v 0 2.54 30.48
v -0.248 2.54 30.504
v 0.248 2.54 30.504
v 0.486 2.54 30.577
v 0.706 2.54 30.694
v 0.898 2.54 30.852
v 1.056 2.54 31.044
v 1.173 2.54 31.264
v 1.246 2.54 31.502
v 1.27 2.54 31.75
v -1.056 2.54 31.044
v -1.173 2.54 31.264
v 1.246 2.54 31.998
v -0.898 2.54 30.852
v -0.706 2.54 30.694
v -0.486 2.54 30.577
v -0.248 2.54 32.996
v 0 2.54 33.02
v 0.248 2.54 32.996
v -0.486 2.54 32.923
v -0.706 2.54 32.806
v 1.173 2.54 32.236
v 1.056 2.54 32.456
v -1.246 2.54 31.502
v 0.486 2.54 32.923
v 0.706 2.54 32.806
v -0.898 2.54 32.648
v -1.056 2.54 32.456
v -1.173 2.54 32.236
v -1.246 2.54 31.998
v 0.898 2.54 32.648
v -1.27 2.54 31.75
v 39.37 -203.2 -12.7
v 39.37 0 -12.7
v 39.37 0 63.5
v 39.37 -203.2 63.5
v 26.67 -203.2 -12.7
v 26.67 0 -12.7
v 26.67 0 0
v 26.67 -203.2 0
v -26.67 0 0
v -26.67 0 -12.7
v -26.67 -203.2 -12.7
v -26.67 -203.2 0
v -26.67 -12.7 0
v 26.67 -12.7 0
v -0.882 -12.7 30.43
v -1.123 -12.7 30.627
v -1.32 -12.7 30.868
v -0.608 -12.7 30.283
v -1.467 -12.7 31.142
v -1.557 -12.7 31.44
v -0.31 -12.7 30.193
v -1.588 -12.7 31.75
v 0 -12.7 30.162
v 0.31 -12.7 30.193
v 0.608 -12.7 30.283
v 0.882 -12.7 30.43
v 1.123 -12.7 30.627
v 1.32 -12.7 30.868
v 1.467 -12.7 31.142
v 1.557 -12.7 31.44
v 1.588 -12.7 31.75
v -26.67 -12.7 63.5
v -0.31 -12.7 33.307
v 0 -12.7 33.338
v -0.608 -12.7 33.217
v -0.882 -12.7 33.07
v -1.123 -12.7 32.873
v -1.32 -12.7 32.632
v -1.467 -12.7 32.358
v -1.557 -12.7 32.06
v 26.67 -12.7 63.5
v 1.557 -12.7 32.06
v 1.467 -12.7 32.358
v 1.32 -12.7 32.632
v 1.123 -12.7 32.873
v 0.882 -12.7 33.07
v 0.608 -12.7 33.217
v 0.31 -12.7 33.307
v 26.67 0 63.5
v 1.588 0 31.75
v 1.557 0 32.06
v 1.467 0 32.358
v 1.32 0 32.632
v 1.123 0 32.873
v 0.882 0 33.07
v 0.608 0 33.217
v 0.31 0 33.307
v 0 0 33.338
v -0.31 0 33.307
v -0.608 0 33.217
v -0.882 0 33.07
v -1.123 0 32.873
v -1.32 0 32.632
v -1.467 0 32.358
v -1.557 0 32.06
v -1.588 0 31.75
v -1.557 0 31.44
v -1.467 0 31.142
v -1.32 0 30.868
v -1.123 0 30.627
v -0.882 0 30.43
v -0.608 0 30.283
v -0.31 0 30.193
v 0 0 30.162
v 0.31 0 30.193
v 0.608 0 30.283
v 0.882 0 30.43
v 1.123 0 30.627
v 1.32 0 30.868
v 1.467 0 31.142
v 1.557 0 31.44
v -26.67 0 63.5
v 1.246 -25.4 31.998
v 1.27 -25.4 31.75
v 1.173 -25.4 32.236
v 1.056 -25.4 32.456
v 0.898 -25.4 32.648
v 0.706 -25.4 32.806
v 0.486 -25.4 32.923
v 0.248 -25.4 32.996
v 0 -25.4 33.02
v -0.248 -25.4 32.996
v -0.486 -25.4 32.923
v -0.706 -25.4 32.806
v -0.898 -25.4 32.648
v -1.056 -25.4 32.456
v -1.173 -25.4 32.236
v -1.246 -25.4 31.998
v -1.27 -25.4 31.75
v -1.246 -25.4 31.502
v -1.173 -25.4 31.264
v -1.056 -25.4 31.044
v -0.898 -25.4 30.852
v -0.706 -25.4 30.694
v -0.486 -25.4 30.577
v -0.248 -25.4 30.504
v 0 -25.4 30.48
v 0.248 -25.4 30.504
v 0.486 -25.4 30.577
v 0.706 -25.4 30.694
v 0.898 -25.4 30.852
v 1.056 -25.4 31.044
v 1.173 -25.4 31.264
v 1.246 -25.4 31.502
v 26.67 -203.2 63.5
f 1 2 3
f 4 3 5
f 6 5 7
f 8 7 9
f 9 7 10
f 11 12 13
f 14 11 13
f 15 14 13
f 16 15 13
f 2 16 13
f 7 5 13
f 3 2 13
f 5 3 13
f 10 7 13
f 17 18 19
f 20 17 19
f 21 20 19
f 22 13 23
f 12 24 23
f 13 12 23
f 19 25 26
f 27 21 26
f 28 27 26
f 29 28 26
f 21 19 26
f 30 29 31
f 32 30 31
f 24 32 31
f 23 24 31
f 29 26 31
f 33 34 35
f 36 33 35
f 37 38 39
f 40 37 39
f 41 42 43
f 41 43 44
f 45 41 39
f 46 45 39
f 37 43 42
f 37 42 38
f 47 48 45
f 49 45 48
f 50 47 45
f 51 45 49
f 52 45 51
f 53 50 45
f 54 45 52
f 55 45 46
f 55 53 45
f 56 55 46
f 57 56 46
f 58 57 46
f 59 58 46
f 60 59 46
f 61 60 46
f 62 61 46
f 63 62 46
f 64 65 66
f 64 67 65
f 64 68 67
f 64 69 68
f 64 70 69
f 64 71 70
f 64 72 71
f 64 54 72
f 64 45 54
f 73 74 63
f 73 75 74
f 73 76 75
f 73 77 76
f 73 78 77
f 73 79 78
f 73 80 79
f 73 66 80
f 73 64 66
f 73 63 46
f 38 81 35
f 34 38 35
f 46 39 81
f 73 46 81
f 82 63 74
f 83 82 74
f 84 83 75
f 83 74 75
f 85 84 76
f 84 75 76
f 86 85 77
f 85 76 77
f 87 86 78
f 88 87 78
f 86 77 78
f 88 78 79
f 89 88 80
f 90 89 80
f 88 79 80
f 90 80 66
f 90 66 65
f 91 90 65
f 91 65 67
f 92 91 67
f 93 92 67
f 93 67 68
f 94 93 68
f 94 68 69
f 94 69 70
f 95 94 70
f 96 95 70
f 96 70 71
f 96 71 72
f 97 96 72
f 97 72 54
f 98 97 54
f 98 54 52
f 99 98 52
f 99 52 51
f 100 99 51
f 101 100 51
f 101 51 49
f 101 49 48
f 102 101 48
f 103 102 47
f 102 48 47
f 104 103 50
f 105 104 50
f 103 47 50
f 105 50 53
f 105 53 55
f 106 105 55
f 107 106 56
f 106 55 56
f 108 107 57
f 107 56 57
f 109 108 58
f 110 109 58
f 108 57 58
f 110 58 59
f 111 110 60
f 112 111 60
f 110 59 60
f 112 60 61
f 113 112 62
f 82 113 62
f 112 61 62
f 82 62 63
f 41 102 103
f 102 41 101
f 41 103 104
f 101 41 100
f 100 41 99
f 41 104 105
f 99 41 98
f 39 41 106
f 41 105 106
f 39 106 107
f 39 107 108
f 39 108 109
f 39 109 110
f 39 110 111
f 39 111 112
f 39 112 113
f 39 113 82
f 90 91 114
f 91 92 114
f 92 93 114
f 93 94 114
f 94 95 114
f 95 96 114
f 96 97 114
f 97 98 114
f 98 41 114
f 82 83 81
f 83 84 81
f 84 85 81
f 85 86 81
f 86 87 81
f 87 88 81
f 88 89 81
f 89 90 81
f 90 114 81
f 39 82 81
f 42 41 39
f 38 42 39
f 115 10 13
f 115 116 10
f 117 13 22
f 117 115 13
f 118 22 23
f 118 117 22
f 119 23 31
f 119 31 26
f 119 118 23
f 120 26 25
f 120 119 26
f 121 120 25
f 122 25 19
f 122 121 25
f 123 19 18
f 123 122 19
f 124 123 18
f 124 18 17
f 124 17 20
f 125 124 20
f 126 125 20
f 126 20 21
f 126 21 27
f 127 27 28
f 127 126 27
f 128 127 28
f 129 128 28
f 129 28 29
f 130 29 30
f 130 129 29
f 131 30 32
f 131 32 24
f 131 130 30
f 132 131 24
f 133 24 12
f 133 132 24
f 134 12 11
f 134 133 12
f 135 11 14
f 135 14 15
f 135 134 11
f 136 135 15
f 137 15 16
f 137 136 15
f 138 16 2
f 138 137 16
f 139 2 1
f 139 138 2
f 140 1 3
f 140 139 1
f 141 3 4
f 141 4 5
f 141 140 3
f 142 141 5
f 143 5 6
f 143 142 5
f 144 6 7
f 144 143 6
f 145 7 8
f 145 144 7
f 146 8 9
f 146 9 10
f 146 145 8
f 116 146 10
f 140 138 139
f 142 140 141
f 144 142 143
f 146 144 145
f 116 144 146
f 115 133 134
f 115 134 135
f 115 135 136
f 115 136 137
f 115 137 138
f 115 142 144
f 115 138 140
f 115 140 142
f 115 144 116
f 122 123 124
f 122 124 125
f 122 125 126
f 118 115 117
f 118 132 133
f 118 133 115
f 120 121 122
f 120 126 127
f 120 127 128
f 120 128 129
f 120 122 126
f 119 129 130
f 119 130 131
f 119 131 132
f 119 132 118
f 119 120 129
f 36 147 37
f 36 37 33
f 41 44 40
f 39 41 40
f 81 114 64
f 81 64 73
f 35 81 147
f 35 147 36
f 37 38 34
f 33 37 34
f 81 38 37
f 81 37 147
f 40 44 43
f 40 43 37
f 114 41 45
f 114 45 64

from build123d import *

# Parameters (mm, degrees)
F0_W          = 53.34
F0_H          = 63.5
F1_DEPTH      = 12.7
F2_W          = 12.7
F2_H          = 76.2
F3_DEPTH      = 203.2
F4_W          = 53.34
F4_H          = 12.7
F5_DEPTH      = 203.2
F6_R          = 1.5875
F7_DEPTH      = 12.701
F8_R          = 1.27
F9_DEPTH      = 12.7
F9_DEPTH_BACK = 15.24


with BuildPart() as f1:
    # F0 (on Front) → F1 (new body)
    with BuildSketch(Plane.XZ):
        with Locations((0, 31.75)):
            Rectangle(F0_W, F0_H)
    extrude(amount=F1_DEPTH)

    # F6 (on face) → F7 (cut, through all)
    with BuildSketch(Plane.XZ.offset(12.7)):
        with Locations((0, 31.75)):
            Circle(F6_R)
    extrude(amount=-F7_DEPTH, mode=Mode.SUBTRACT)


with BuildPart() as f3:
    # F2 (on Front) → F3 (new body)
    with BuildSketch(Plane.XZ):
        with Locations((33.02, 25.4)):
            Rectangle(F2_W, F2_H)
    extrude(amount=F3_DEPTH)


with BuildPart() as f5:
    # F4 (on Front) → F5 (new body, through all)
    with BuildSketch(Plane.XZ):
        with Locations((0, -6.35)):
            Rectangle(F4_W, F4_H)
    extrude(amount=F5_DEPTH)


with BuildPart() as f9:
    # F8 (on face) → F9 (new body, two sides)
    with BuildSketch(Plane.XZ.offset(12.7)) as f9_sk:
        with Locations((0, 31.75)):
            Circle(F8_R)
    extrude(amount=F9_DEPTH)
    extrude(f9_sk.sketch, amount=-F9_DEPTH_BACK)


solid = Compound([f1.part, f3.part, f5.part, f9.part])
